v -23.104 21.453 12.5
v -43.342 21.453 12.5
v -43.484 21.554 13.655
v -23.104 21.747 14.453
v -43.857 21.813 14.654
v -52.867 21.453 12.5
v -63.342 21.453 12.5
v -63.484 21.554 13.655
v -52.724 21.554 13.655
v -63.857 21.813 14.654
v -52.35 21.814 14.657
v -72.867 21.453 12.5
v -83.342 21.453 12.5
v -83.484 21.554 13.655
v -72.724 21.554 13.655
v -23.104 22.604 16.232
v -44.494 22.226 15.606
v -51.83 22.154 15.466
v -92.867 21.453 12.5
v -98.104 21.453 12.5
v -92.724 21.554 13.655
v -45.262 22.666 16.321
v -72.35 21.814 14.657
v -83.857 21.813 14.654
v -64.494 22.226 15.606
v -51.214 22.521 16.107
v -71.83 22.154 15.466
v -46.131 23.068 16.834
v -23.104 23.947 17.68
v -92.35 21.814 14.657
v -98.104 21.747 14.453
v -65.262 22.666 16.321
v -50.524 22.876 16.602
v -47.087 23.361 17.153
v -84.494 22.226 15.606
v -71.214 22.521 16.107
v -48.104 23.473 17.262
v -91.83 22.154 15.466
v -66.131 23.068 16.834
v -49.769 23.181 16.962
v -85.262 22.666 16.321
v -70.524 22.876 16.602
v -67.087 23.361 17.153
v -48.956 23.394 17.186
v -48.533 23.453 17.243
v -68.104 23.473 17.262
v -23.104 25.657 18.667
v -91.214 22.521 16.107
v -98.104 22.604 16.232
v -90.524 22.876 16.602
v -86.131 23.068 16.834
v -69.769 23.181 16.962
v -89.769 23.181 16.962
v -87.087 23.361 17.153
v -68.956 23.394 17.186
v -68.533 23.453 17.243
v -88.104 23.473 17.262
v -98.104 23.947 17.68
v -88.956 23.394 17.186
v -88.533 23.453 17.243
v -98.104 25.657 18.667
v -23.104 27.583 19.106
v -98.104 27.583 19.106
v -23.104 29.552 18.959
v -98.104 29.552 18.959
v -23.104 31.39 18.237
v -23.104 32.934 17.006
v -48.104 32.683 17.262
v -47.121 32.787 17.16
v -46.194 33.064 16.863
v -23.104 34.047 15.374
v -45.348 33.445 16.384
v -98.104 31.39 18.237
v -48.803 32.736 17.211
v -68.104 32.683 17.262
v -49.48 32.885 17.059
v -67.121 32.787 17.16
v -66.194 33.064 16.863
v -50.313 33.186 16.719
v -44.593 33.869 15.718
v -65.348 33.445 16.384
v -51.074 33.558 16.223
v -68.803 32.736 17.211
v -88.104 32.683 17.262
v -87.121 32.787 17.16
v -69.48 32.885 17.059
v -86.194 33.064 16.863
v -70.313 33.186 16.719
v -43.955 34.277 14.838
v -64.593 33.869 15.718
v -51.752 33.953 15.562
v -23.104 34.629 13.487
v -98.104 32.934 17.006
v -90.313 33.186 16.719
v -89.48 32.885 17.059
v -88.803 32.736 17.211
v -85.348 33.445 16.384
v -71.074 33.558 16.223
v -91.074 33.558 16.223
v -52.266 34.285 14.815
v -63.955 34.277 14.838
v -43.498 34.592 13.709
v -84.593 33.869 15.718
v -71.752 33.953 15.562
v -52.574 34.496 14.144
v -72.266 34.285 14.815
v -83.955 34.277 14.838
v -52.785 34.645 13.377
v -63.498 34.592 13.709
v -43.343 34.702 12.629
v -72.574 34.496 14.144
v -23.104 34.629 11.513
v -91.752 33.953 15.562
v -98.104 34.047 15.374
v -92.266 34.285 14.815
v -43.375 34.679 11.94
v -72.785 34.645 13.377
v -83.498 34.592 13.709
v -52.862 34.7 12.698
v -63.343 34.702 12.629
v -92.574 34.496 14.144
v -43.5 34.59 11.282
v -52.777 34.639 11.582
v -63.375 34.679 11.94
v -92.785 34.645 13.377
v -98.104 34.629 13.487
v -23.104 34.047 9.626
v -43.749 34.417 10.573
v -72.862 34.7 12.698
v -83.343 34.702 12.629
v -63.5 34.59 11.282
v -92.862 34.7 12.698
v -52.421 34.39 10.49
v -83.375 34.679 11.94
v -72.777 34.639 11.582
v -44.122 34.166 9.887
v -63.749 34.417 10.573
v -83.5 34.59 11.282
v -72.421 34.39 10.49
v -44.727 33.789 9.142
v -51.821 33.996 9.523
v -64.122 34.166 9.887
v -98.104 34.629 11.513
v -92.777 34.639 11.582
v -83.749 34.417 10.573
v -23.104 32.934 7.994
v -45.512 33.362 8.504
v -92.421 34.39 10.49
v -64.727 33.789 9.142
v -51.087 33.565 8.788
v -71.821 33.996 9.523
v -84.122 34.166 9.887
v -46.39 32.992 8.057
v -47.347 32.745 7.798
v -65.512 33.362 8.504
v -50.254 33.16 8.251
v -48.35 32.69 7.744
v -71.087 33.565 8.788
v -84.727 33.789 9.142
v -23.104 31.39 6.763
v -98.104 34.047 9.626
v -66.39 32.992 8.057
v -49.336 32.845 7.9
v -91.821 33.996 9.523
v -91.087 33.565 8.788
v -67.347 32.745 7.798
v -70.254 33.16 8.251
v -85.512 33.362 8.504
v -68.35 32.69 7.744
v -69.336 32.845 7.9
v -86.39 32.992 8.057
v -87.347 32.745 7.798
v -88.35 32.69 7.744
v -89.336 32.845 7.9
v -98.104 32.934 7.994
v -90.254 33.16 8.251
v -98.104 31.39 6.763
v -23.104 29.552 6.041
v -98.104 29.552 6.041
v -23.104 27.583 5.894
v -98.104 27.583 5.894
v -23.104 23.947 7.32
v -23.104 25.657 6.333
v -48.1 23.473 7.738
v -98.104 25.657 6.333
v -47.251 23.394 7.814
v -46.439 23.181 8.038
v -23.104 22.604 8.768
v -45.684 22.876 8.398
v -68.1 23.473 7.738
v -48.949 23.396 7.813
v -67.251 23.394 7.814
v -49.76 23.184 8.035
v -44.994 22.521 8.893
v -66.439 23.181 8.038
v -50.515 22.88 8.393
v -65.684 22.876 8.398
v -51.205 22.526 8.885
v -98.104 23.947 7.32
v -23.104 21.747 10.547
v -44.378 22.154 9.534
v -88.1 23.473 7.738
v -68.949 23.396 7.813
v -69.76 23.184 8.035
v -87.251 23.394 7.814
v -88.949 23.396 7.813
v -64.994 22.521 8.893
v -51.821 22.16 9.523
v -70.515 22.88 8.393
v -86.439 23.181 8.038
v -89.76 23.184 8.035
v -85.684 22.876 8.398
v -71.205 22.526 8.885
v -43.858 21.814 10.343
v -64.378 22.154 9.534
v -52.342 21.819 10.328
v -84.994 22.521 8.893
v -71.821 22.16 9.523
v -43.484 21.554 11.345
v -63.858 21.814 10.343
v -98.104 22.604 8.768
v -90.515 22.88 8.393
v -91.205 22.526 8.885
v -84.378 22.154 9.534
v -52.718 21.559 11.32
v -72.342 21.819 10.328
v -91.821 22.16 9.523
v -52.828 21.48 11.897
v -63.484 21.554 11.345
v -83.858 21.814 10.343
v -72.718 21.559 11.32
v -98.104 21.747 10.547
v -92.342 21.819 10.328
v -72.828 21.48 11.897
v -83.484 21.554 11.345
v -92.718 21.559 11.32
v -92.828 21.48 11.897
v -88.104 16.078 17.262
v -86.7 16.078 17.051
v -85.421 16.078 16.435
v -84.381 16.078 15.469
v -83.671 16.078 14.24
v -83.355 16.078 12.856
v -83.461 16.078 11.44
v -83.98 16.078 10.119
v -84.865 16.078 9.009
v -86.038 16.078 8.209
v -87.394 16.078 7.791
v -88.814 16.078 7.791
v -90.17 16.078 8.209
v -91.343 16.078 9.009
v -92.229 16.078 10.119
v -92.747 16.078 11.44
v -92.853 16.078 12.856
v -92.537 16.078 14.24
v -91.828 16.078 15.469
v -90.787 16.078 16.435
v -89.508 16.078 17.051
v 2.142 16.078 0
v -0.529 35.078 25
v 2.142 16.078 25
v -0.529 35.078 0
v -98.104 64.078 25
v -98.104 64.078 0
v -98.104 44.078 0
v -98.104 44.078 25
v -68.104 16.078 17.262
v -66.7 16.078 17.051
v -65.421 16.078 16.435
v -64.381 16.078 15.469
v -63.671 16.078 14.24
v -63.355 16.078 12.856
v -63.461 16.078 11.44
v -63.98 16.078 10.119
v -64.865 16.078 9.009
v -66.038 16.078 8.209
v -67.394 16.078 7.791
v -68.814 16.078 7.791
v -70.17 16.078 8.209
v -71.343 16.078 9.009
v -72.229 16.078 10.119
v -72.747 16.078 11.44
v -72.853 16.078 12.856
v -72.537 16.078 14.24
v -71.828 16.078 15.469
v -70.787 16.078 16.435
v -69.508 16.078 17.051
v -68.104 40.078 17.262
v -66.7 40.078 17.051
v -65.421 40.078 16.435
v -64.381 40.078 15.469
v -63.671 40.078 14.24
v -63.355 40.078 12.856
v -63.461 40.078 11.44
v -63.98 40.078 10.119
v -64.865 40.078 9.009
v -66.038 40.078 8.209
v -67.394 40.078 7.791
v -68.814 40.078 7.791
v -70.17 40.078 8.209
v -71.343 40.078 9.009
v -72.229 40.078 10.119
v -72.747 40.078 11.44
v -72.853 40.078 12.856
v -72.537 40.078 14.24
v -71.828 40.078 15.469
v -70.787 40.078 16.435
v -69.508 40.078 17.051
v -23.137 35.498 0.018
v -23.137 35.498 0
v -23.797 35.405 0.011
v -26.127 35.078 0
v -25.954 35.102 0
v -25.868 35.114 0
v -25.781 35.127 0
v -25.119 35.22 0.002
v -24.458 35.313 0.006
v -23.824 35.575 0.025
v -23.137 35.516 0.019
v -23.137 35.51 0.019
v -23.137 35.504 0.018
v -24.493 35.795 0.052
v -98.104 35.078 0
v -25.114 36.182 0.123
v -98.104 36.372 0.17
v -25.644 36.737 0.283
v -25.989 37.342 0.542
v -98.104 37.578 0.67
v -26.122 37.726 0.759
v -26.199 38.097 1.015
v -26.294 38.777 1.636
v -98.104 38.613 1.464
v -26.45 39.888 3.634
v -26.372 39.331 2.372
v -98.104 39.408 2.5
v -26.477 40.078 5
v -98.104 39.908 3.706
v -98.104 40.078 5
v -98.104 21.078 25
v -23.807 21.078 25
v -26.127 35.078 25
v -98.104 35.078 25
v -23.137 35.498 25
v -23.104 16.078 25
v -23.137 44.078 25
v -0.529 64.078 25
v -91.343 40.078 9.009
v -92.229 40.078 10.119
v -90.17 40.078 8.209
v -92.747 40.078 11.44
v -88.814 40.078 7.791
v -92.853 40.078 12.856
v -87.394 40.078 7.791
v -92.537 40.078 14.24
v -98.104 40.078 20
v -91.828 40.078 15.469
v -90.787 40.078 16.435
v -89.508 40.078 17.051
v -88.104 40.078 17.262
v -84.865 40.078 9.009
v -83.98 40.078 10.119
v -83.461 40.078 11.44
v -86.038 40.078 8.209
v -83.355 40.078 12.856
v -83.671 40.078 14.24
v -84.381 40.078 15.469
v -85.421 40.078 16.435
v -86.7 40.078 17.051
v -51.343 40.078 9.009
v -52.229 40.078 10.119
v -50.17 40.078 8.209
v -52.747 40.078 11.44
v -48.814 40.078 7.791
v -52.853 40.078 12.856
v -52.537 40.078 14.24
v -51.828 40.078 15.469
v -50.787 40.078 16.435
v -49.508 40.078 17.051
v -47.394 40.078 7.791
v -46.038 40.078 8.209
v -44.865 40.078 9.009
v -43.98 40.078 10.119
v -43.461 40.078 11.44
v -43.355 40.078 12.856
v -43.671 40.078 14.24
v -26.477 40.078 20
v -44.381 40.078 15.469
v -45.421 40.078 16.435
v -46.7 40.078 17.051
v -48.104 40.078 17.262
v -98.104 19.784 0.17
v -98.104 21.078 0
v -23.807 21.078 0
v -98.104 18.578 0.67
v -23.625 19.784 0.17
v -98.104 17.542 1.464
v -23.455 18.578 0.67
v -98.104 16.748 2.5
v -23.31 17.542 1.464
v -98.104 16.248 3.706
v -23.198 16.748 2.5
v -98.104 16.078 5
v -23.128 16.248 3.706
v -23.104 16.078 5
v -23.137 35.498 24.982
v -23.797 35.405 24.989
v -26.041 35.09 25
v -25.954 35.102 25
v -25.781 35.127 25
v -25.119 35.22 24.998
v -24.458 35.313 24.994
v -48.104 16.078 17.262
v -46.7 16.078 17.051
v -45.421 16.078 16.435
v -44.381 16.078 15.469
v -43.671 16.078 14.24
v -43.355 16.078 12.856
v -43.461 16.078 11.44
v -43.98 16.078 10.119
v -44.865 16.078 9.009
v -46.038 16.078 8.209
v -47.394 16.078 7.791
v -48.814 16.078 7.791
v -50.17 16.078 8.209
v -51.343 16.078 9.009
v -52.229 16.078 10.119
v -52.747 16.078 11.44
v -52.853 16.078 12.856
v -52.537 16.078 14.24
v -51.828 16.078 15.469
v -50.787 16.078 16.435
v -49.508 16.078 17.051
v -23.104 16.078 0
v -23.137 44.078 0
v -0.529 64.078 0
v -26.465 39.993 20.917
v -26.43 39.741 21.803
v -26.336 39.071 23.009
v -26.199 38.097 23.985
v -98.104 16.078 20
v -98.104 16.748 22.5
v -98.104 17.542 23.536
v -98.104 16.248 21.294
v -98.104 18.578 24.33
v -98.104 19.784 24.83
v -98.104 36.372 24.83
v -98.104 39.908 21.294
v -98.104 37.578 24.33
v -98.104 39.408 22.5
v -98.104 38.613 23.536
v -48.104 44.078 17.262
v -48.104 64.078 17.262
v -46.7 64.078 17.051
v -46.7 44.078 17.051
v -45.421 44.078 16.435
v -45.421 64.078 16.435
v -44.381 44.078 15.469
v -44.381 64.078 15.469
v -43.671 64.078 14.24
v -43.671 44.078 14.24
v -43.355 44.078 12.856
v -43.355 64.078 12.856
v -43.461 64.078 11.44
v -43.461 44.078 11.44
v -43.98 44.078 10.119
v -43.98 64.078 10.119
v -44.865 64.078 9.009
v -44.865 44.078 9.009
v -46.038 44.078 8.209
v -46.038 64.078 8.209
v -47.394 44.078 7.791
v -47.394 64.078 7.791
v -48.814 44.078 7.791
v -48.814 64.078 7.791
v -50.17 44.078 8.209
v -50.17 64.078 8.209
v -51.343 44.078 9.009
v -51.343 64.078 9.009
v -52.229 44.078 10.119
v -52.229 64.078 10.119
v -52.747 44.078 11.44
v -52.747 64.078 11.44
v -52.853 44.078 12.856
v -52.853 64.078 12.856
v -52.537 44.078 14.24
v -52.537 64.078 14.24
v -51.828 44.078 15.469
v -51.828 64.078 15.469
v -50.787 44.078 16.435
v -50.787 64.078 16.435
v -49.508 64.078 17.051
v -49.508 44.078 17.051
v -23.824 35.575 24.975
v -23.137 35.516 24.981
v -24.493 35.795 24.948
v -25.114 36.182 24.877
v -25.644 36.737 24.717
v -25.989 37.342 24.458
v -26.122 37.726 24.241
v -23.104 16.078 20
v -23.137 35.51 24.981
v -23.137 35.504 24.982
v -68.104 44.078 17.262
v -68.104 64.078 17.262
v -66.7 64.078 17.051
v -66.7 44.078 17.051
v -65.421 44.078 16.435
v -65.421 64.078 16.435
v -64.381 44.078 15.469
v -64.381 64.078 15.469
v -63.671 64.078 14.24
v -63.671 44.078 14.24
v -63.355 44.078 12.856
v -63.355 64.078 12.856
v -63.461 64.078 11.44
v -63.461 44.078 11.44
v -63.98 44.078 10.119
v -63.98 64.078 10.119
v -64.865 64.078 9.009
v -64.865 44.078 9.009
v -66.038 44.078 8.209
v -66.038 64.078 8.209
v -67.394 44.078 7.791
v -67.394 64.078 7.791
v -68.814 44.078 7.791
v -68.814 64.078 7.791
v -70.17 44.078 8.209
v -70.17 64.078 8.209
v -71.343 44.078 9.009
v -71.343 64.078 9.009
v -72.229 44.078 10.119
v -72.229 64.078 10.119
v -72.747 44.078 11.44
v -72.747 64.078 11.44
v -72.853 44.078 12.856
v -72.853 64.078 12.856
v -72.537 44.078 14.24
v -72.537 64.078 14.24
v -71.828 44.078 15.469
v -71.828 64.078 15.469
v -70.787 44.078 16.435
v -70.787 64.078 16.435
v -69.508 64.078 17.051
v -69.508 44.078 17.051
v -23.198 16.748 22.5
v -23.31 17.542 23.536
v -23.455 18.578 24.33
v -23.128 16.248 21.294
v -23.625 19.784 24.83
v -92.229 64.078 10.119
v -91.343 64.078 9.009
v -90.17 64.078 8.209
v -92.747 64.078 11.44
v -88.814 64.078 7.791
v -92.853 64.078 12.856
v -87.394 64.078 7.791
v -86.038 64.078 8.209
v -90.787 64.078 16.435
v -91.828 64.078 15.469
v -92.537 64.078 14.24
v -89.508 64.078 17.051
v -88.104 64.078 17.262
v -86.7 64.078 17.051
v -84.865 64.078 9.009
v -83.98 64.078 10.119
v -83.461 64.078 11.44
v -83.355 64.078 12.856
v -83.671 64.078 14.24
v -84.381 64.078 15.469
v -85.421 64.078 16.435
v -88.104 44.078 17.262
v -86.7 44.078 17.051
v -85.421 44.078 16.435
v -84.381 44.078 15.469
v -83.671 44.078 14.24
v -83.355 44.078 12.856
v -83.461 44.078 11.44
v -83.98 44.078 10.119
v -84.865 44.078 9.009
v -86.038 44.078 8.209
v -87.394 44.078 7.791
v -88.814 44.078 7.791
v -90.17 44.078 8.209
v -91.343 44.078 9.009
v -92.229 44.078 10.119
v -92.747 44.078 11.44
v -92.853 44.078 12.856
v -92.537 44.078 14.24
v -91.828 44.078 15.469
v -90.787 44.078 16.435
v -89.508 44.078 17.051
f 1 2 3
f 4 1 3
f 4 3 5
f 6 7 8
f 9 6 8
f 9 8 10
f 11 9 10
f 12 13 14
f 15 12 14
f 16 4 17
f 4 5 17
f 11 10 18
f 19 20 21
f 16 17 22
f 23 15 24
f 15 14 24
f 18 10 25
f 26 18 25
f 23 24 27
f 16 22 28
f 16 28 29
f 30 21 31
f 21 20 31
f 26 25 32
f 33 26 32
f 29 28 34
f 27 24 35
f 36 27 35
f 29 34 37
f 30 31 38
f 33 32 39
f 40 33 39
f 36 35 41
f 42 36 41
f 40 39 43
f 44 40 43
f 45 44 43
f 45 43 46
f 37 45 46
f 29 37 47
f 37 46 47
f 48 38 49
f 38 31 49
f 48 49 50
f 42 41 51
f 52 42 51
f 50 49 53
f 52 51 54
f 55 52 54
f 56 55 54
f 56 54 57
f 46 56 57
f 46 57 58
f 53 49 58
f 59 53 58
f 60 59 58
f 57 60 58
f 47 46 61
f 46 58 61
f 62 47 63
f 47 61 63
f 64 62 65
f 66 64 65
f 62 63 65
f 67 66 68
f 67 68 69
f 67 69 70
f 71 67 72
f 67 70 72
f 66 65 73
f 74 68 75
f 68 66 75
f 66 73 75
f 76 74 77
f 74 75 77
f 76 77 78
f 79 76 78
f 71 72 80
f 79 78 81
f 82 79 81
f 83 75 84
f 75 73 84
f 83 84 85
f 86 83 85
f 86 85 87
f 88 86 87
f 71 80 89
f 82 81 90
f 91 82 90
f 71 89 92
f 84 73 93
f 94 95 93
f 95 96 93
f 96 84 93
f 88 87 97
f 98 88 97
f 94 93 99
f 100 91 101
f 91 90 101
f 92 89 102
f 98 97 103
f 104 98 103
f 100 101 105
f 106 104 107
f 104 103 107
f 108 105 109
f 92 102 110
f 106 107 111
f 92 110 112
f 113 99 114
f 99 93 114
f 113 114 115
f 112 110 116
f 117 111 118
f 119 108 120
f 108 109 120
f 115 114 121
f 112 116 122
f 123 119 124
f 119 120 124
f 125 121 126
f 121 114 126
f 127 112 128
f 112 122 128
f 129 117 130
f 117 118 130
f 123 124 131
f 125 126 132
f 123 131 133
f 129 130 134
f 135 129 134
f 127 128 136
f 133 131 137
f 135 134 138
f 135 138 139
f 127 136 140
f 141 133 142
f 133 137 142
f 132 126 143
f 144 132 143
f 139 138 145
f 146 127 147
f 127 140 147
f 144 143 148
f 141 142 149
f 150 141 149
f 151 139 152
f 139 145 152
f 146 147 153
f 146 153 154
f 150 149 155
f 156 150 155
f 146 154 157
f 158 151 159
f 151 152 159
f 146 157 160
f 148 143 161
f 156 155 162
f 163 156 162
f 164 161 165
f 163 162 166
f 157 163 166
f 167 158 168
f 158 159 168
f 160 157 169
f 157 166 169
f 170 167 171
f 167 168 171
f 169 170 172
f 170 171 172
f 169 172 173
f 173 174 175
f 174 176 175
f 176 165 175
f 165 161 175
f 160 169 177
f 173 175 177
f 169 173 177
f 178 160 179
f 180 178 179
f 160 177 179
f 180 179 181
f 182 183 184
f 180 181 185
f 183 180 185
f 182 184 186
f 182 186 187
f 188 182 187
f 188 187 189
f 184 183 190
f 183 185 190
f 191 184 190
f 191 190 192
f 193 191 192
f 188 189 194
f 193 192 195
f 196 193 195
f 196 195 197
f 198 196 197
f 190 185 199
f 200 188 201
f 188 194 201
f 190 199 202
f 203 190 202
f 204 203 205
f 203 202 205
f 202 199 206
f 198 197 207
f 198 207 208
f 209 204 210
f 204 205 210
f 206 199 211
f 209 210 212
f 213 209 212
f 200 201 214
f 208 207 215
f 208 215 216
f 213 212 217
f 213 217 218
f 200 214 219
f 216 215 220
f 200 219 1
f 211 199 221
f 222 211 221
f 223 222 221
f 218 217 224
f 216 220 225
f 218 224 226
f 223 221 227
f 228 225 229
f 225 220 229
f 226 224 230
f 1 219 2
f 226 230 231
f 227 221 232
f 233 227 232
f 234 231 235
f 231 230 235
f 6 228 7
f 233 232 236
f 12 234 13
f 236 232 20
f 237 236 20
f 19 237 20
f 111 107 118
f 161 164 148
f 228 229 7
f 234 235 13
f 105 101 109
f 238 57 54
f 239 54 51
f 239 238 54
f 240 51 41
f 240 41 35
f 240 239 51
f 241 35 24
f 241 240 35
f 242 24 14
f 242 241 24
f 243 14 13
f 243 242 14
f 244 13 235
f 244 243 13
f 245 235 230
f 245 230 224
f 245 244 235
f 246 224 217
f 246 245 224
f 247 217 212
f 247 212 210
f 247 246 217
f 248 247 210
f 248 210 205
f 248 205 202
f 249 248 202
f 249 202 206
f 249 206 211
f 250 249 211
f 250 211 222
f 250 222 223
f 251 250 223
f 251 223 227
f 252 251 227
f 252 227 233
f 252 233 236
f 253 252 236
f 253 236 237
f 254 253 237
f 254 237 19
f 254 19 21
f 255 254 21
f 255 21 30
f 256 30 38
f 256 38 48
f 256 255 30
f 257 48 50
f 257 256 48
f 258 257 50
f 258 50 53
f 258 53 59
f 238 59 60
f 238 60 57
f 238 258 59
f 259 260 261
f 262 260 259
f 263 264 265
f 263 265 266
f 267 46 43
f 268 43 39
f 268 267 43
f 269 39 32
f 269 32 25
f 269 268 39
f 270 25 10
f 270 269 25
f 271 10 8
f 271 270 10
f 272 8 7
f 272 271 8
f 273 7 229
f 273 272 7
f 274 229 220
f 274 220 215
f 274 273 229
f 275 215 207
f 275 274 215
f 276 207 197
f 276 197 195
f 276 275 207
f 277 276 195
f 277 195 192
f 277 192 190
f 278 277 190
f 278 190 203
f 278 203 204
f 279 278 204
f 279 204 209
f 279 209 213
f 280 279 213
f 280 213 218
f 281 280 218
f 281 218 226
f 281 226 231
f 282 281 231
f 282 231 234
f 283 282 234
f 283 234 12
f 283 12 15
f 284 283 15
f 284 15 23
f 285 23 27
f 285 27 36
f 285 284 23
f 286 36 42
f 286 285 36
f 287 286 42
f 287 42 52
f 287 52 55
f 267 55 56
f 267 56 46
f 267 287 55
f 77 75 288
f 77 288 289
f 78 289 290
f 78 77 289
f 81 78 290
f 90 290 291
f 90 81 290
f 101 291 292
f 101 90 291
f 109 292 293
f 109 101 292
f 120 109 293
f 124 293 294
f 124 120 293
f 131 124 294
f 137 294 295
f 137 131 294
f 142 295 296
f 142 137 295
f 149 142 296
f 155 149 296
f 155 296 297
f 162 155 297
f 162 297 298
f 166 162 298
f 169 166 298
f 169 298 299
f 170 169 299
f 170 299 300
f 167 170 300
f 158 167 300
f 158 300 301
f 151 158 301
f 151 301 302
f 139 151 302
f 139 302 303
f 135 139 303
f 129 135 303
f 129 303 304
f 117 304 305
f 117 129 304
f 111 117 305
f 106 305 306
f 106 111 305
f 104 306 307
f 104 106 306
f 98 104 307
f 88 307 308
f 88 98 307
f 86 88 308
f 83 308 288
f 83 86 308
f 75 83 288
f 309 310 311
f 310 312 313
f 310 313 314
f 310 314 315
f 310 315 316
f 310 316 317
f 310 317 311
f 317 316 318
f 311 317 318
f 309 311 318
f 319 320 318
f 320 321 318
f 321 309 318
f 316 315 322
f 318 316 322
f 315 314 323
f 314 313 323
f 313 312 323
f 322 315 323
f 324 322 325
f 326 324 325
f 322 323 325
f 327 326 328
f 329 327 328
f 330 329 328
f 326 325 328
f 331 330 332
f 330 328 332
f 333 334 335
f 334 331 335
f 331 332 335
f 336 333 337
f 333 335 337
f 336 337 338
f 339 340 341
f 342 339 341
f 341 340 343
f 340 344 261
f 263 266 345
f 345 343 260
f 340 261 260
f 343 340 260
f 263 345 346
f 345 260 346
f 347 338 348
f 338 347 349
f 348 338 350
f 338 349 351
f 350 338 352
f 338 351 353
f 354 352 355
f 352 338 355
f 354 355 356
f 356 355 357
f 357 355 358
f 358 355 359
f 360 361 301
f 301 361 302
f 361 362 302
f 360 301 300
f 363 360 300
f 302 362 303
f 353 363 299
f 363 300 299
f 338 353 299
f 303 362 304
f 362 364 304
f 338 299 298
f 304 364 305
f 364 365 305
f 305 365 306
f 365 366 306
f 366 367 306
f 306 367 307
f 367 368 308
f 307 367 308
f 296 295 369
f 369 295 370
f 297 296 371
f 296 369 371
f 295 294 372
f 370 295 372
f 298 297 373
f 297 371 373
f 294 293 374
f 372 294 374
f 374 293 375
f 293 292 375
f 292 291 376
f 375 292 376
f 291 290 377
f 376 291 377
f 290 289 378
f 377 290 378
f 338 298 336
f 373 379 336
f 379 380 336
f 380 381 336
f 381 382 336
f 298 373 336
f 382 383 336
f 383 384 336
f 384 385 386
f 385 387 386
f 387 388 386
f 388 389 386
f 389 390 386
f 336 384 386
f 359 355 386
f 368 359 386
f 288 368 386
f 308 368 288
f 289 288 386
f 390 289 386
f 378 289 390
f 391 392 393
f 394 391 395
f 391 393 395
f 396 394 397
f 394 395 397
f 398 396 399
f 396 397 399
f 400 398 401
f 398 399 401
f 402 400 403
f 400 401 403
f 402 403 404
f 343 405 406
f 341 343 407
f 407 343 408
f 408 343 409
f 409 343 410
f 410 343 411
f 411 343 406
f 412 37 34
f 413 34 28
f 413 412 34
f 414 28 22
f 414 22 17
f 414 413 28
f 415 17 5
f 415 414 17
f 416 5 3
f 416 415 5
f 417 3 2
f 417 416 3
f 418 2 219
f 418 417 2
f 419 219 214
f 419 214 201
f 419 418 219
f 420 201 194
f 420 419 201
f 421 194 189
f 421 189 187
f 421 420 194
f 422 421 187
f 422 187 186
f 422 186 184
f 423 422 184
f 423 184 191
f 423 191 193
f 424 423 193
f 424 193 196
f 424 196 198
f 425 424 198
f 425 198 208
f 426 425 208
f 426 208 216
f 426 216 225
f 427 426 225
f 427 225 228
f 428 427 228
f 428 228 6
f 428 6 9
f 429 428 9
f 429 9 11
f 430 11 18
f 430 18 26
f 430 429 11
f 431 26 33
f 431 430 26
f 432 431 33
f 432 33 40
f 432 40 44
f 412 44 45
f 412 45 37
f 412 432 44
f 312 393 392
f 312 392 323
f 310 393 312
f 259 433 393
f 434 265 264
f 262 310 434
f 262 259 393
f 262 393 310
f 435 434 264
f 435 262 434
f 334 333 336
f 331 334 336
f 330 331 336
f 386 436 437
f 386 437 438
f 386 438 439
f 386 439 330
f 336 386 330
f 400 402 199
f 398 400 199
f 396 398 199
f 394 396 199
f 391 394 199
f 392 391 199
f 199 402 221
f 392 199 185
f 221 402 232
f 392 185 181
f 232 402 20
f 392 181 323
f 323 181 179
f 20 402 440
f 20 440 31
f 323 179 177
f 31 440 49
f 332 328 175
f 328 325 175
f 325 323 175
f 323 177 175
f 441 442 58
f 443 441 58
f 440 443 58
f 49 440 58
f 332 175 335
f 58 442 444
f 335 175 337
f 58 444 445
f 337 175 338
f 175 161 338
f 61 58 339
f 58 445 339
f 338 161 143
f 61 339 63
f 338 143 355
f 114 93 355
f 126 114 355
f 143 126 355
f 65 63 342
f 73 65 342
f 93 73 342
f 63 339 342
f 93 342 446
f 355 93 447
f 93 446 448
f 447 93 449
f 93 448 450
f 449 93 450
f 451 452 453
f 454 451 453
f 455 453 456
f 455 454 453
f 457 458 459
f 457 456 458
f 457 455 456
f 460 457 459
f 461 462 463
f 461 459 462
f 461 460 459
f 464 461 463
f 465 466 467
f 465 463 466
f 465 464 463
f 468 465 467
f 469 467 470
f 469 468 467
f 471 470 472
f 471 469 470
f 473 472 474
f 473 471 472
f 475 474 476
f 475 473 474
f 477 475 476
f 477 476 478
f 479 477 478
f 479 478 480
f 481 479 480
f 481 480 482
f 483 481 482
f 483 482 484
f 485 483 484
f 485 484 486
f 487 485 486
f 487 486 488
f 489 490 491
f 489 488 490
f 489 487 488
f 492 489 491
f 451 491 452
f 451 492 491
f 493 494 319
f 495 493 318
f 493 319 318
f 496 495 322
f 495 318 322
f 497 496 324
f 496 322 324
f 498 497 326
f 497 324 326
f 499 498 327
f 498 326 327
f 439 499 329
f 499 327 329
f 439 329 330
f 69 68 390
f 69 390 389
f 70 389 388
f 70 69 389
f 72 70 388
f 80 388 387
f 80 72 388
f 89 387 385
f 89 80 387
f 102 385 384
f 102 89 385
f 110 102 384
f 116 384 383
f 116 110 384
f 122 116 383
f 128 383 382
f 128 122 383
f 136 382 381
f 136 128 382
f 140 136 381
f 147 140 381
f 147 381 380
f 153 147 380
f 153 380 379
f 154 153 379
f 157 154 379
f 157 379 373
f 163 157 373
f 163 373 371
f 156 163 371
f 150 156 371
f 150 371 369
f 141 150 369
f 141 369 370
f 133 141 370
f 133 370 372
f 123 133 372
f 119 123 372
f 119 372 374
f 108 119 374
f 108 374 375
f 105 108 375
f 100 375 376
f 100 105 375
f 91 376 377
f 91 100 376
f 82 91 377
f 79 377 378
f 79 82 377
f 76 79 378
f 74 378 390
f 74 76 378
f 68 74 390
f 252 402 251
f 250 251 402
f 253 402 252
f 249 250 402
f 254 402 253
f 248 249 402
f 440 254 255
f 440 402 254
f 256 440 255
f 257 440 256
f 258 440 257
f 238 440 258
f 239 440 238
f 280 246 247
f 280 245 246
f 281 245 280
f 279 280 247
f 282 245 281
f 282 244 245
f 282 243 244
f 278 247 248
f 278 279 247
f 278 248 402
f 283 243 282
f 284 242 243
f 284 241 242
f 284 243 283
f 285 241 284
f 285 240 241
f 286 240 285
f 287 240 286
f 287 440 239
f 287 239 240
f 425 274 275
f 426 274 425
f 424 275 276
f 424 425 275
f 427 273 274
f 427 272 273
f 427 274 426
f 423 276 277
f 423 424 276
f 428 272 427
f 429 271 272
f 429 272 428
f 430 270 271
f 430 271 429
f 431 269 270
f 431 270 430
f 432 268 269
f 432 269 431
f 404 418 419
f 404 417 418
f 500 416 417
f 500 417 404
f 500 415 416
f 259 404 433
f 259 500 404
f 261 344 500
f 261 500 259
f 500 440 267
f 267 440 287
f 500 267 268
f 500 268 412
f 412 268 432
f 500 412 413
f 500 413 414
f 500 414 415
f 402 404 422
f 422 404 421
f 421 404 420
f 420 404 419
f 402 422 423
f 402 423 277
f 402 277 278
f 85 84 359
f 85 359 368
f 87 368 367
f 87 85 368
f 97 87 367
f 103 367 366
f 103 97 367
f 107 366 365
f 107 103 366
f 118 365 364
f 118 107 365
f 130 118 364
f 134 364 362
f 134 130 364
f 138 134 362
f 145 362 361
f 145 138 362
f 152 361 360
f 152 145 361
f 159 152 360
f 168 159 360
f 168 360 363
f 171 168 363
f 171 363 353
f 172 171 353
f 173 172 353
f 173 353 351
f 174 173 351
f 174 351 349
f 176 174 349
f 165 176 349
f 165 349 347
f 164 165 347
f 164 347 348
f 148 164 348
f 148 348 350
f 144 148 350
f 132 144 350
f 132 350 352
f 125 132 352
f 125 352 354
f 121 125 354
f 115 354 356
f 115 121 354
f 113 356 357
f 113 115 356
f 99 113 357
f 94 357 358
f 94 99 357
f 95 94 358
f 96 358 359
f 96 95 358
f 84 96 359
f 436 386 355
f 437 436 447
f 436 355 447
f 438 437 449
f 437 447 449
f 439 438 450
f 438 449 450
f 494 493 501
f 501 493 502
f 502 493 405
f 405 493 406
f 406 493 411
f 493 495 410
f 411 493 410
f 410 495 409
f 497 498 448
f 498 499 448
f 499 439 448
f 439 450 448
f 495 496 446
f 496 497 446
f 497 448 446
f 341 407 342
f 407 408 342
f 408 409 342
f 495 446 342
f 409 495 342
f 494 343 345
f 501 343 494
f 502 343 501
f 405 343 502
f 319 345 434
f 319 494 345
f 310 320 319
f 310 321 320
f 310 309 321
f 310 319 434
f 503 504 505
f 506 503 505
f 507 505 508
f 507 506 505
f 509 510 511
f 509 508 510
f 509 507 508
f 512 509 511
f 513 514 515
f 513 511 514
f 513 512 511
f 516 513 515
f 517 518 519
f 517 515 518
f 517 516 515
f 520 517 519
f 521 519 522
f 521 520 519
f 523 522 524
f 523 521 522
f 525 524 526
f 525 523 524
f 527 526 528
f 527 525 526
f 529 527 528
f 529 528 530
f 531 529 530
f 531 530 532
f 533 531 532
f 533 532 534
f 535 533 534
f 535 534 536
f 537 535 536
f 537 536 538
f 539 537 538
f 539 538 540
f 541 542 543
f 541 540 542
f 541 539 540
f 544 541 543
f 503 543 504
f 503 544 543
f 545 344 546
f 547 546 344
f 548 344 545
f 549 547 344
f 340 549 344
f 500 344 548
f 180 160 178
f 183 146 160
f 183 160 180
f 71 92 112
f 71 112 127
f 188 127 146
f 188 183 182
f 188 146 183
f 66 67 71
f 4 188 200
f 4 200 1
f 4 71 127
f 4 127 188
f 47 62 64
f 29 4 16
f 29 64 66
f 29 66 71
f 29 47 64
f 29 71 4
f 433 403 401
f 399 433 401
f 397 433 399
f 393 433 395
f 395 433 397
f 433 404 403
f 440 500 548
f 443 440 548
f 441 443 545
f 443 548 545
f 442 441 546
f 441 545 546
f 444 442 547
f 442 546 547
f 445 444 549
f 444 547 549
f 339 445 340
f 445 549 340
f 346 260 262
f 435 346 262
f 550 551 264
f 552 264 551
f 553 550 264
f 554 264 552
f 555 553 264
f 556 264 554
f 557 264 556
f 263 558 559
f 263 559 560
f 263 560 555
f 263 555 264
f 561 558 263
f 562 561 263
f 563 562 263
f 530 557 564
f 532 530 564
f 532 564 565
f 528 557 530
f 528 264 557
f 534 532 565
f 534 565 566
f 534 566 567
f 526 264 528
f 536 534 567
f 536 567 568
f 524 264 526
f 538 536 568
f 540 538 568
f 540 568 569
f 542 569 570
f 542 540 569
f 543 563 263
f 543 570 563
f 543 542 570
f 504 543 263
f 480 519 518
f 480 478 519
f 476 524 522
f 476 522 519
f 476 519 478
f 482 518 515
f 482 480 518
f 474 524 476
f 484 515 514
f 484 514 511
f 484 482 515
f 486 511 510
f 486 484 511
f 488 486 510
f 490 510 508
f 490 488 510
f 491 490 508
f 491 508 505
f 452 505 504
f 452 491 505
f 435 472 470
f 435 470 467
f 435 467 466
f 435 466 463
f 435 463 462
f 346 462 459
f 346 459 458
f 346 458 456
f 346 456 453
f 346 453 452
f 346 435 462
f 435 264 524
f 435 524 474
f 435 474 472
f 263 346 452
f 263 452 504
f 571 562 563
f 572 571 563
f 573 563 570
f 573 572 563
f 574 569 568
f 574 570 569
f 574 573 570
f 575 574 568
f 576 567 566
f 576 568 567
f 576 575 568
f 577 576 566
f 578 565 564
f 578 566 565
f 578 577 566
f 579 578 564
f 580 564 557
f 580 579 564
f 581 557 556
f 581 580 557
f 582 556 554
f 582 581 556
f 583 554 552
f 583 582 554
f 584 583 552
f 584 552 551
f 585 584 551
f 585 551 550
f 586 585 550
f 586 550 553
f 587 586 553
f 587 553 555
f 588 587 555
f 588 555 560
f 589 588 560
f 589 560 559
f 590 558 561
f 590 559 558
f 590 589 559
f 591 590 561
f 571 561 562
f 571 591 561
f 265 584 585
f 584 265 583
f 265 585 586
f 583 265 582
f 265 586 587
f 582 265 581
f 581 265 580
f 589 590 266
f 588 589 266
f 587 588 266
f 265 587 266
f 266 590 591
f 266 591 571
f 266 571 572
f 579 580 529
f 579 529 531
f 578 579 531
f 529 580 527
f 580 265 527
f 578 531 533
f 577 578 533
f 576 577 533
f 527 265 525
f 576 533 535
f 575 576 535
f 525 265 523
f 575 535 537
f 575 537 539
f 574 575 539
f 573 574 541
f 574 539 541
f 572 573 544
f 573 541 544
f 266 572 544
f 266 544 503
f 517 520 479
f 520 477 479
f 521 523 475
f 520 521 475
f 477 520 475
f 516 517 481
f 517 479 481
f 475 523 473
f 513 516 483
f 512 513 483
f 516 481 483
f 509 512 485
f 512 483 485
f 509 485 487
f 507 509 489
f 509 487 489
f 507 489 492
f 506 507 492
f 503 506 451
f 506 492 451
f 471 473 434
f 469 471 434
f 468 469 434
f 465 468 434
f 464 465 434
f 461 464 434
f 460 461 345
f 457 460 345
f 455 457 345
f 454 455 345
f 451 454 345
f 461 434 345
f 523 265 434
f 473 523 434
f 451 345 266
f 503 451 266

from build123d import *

# Parameters (mm, degrees)
SKETCH1_W                = 50
SKETCH1_H                = 25
BOSS_EXTRUDE1_DEPTH      = 25
BOSS_EXTRUDE2_DEPTH      = 25
SKETCH4_R                = 6.625
CUT_EXTRUDE1_DEPTH       = 75
SKETCH9_R                = 3.1
CUT_EXTRUDE6_DEPTH       = 116.938210964
FILLET3_R                = 5
FILLET5_R                = 3
SKETCH10_W               = 47.732743957
SKETCH10_H               = 107.667843513
CUT_EXTRUDE7_DEPTH       = 100
SKETCH11_W               = 28.236029243
SKETCH11_H               = 25
CUT_EXTRUDE8_DEPTH       = 111.285013225
SKETCH12_W               = 27.477268163
SKETCH12_H               = 27.699456316
CUT_EXTRUDE9_DEPTH       = 5
BODY_MOVE_COPY1_ANGLE    = 8
SKETCH13_W               = 22.608001889
SKETCH13_H               = 25
BOSS_EXTRUDE3_DEPTH      = 29
SKETCH14_W               = 25
SKETCH14_H               = 20
BOSS_EXTRUDE4_DEPTH      = 74.967411564
CUT_EXTRUDE10_DEPTH      = 113.041997451
CUT_EXTRUDE10_DEPTH_BACK = 113.041997451
SKETCH15_R               = 4.7625
SKETCH15_R_2             = 3.1


with BuildPart() as part:
    # Sketch1 → Boss-Extrude1 (new body)
    with BuildSketch(Plane.XY):
        Rectangle(SKETCH1_W, SKETCH1_H)
    extrude(amount=BOSS_EXTRUDE1_DEPTH)

    # Sketch3 → Boss-Extrude2 (add)
    with BuildSketch(Plane.XY.offset(25)):
        Polygon((-25, 12.5), (-99.270105156, 22.937982572), (-95.929950733, 46.704416222), (-25, 36.73586174), (-25, 31.73586174), (25, 31.73586174), (25, 36.73586174), (95.929950733, 46.704416222), (99.270105156, 22.937982572), (25, 12.5), align=None)
    extrude(amount=-BOSS_EXTRUDE2_DEPTH)

    # Sketch4 → Cut-Extrude1 (cut)
    with BuildSketch(Plane(origin=(-100.508609829, 14.12556392, 0), x_dir=(0, 0, 1), z_dir=(-0.9902680687415705, 0.13917310096006502, 0))):
        with Locations(Location((12.5, 20.899023335, 0), (0, 0, 270))):
            Circle(SKETCH4_R)
    cut_extrude1 = extrude(amount=-CUT_EXTRUDE1_DEPTH, mode=Mode.SUBTRACT)

    # Mirror1: Cut-Extrude1 across plane
    add(cut_extrude1.mirror(Plane(origin=(0, 0, 0), x_dir=(0, 0, 1), z_dir=(1, 0, 0))), mode=Mode.SUBTRACT)

    # Sketch9 → Cut-Extrude6 (cut, through all)
    with BuildSketch(Plane(origin=(4.578659096, 32.578852302, 0), x_dir=(0.9902680687415703, -0.1391731009600656, 0), z_dir=(0.1391731009600656, 0.9902680687415703, 0))):
        with Locations(Location((-91.496365481, -12.5, 0), (0, 0, 180))):
            Circle(SKETCH9_R)
        with Locations(Location((-71.496365481, -12.5, 0), (0, 0, 180))):
            Circle(SKETCH9_R)
        with Locations(Location((-51.496365481, -12.5, 0), (0, 0, 180))):
            Circle(SKETCH9_R)
    extrude(amount=-CUT_EXTRUDE6_DEPTH, mode=Mode.SUBTRACT)

    # Fillet3
    # the kernel refuses this fillet: 5 mm, written as the material it takes off along each edge
    with BuildSketch(Plane(origin=(111.648456015, 24.677646334, 25), x_dir=(-0.13917310096006577, 0.9902680687415704, 0), z_dir=(-0.9902680687415703, -0.13917310096006574, 0))) as fillet3_piece_1_section:
        with BuildLine():
            CenterArc((FILLET3_R, FILLET3_R), FILLET3_R, 180, 90)
            Line((0, FILLET3_R), (0, 0))
            Line((0, 0), (FILLET3_R, 0))
        make_face()
    fillet3_piece_1 = extrude(amount=100, mode=Mode.PRIVATE)
    fillet3_piece_1 = split(fillet3_piece_1, bisect_by=Plane(origin=(25, 18.834233779, 23.882189323), z_dir=(1, 0, 0)), keep=Keep.TOP, mode=Mode.PRIVATE)
    add(fillet3_piece_1, mode=Mode.SUBTRACT)
    with BuildSketch(Plane(origin=(12.621649141, 34.996197978, 25), x_dir=(0.13917310096006597, -0.9902680687415704, 0), z_dir=(0.9902680687415703, 0.13917310096006597, 0))) as fillet3_piece_2_section:
        with BuildLine():
            CenterArc((FILLET3_R, FILLET3_R), FILLET3_R, 180, 90)
            Line((0, FILLET3_R), (0, 0))
            Line((0, 0), (FILLET3_R, 0))
        make_face()
    fillet3_piece_2 = extrude(amount=96.627019967, mode=Mode.PRIVATE)
    fillet3_piece_2 = split(fillet3_piece_2, bisect_by=Plane(origin=(60.542812169, 31.73586174, 23.884172665), z_dir=(0, 1, 0)), keep=Keep.TOP, mode=Mode.PRIVATE)
    add(fillet3_piece_2, mode=Mode.SUBTRACT)
    with BuildSketch(Plane(origin=(-108.308301592, 48.444079984, 25), x_dir=(-0.13917310096006566, -0.9902680687415704, 0), z_dir=(0.9902680687415704, -0.13917310096006566, 0))) as fillet3_piece_3_section:
        with BuildLine():
            CenterArc((FILLET3_R, FILLET3_R), FILLET3_R, 180, 90)
            Line((0, FILLET3_R), (0, 0))
            Line((0, 0), (FILLET3_R, 0))
        make_face()
    fillet3_piece_3 = extrude(amount=96.627019967, mode=Mode.PRIVATE)
    fillet3_piece_3 = split(fillet3_piece_3, bisect_by=Plane(origin=(-60.542812169, 31.73586174, 23.884172665), z_dir=(0, 1, 0)), keep=Keep.TOP, mode=Mode.PRIVATE)
    add(fillet3_piece_3, mode=Mode.SUBTRACT)
    with BuildSketch(Plane(origin=(-12.621649141, 10.760336238, 25), x_dir=(0.13917310096006563, 0.9902680687415704, 0), z_dir=(-0.9902680687415703, 0.13917310096006563, 0))) as fillet3_piece_4_section:
        with BuildLine():
            CenterArc((FILLET3_R, FILLET3_R), FILLET3_R, 180, 90)
            Line((0, FILLET3_R), (0, 0))
            Line((0, 0), (FILLET3_R, 0))
        make_face()
    fillet3_piece_4 = extrude(amount=100, mode=Mode.PRIVATE)
    fillet3_piece_4 = split(fillet3_piece_4, bisect_by=Plane(origin=(-25, 18.834233779, 23.882189323), z_dir=(-1, 0, 0)), keep=Keep.TOP, mode=Mode.PRIVATE)
    add(fillet3_piece_4, mode=Mode.SUBTRACT)
    with BuildSketch(Plane(origin=(111.648456015, 24.677646334, 0), x_dir=(-0.13917310096006577, 0.9902680687415704, 0), z_dir=(-0.9902680687415703, -0.13917310096006574, 0))) as fillet3_piece_5_section:
        with BuildLine():
            CenterArc((FILLET3_R, -FILLET3_R), FILLET3_R, 90, 90)
            Line((0, -FILLET3_R), (0, 0))
            Line((0, 0), (FILLET3_R, 0))
        make_face()
    fillet3_piece_5 = extrude(amount=100, mode=Mode.PRIVATE)
    fillet3_piece_5 = split(fillet3_piece_5, bisect_by=Plane(origin=(25, 18.834233779, 1.117810677), z_dir=(1, 0, 0)), keep=Keep.TOP, mode=Mode.PRIVATE)
    add(fillet3_piece_5, mode=Mode.SUBTRACT)
    with BuildSketch(Plane(origin=(12.621649141, 34.996197978, 0), x_dir=(0.13917310096006597, -0.9902680687415704, 0), z_dir=(0.9902680687415703, 0.13917310096006597, 0))) as fillet3_piece_6_section:
        with BuildLine():
            CenterArc((FILLET3_R, -FILLET3_R), FILLET3_R, 90, 90)
            Line((0, -FILLET3_R), (0, 0))
            Line((0, 0), (FILLET3_R, 0))
        make_face()
    fillet3_piece_6 = extrude(amount=96.627019967, mode=Mode.PRIVATE)
    fillet3_piece_6 = split(fillet3_piece_6, bisect_by=Plane(origin=(60.542812169, 31.73586174, 1.115827335), z_dir=(0, 1, 0)), keep=Keep.TOP, mode=Mode.PRIVATE)
    add(fillet3_piece_6, mode=Mode.SUBTRACT)
    with BuildSketch(Plane(origin=(-108.308301592, 48.444079984, 0), x_dir=(-0.13917310096006566, -0.9902680687415704, 0), z_dir=(0.9902680687415704, -0.13917310096006566, 0))) as fillet3_piece_7_section:
        with BuildLine():
            CenterArc((FILLET3_R, -FILLET3_R), FILLET3_R, 90, 90)
            Line((0, -FILLET3_R), (0, 0))
            Line((0, 0), (FILLET3_R, 0))
        make_face()
    fillet3_piece_7 = extrude(amount=96.627019967, mode=Mode.PRIVATE)
    fillet3_piece_7 = split(fillet3_piece_7, bisect_by=Plane(origin=(-60.542812169, 31.73586174, 1.115827335), z_dir=(0, 1, 0)), keep=Keep.TOP, mode=Mode.PRIVATE)
    add(fillet3_piece_7, mode=Mode.SUBTRACT)
    with BuildSketch(Plane(origin=(-12.621649141, 10.760336238, 0), x_dir=(0.13917310096006563, 0.9902680687415704, 0), z_dir=(-0.9902680687415703, 0.13917310096006563, 0))) as fillet3_piece_8_section:
        with BuildLine():
            CenterArc((FILLET3_R, -FILLET3_R), FILLET3_R, 90, 90)
            Line((0, -FILLET3_R), (0, 0))
            Line((0, 0), (FILLET3_R, 0))
        make_face()
    fillet3_piece_8 = extrude(amount=100, mode=Mode.PRIVATE)
    fillet3_piece_8 = split(fillet3_piece_8, bisect_by=Plane(origin=(-25, 18.834233779, 1.117810677), z_dir=(-1, 0, 0)), keep=Keep.TOP, mode=Mode.PRIVATE)
    add(fillet3_piece_8, mode=Mode.SUBTRACT)

    # Fillet5
    fillet5_edges = [part.edges().sort_by_distance(p)[0] for p in [
        (25, 31.73586174, 12.5),
        (-25, 31.73586174, 12.5),
    ]]
    fillet(fillet5_edges, radius=FILLET5_R)

    # Sketch10 → Cut-Extrude7 (cut)
    with BuildSketch(Plane(origin=(0, 0, 0), x_dir=(0, 0, -1), z_dir=(1, 0, 0))):
        with Locations((-11.782214376, 4.002620484)):
            Rectangle(SKETCH10_W, SKETCH10_H)
    extrude(amount=CUT_EXTRUDE7_DEPTH, mode=Mode.SUBTRACT)

    # Sketch11 → Cut-Extrude8 (cut, through all)
    with BuildSketch(Plane(origin=(1.238504673, 8.812418652, 0), x_dir=(0.9902680687415703, -0.13917310096006563, 0), z_dir=(-0.13917310096006563, -0.9902680687415703, 0))):
        with Locations((-12.37835086, 12.5)):
            Rectangle(SKETCH11_W, SKETCH11_H)
    extrude(amount=CUT_EXTRUDE8_DEPTH, mode=Mode.SUBTRACT)

    # Sketch12 → Cut-Extrude9 (cut)
    with BuildSketch(Plane(origin=(4.578659096, 32.578852302, 0), x_dir=(0.9902680687415703, -0.1391731009600656, 0), z_dir=(0.1391731009600656, 0.9902680687415703, 0))):
        with Locations((-12.790319835, -12.604422979)):
            Rectangle(SKETCH12_W, SKETCH12_H)
    extrude(amount=-CUT_EXTRUDE9_DEPTH, mode=Mode.SUBTRACT)


with BuildPart() as part_1:
    # Body-Move/Copy1: moved
    add(part.part.rotate(Axis((-49.635052578, 27.845447677, 0), (0, 0, 1)), BODY_MOVE_COPY1_ANGLE))

    # Sketch13 → Boss-Extrude3 (add)
    with BuildSketch(Plane(origin=(0, 35.077877501, 0), x_dir=(1, 0, 0), z_dir=(0, 1, 0))):
        with Locations((-11.832660591, -12.5)):
            Rectangle(SKETCH13_W, SKETCH13_H)
    extrude(amount=BOSS_EXTRUDE3_DEPTH)

    # Sketch14 → Boss-Extrude4 (add)
    with BuildSketch(Plane.ZY.offset(23.136661535)):
        with Locations((12.5, 54.077877501)):
            Rectangle(SKETCH14_W, SKETCH14_H)
    extrude(amount=BOSS_EXTRUDE4_DEPTH)

    # Sketch15 → Cut-Extrude10 (cut, two sides: drawn at the far end of the back side and taken through both)
    # profile 1 of 6: a face of its own
    with BuildSketch(Plane(origin=(0, 64.077877501, 0), x_dir=(1, 0, 0), z_dir=(0, 1, 0)).offset(-CUT_EXTRUDE10_DEPTH_BACK)):
        with Locations(Location((-88.104073099, -12.5, 0), (0, 0, 270))):
            Circle(SKETCH15_R)
        with Locations((-88.104073099, -12.5)):
            Circle(SKETCH15_R_2, mode=Mode.SUBTRACT)
    # profile 2 of 6: a face of its own
    with BuildSketch(Plane(origin=(0, 64.077877501, 0), x_dir=(1, 0, 0), z_dir=(0, 1, 0)).offset(-CUT_EXTRUDE10_DEPTH_BACK)):
        with Locations((-88.104073099, -12.5)):
            Circle(SKETCH15_R_2)
    # profile 3 of 6: a face of its own
    with BuildSketch(Plane(origin=(0, 64.077877501, 0), x_dir=(1, 0, 0), z_dir=(0, 1, 0)).offset(-CUT_EXTRUDE10_DEPTH_BACK)):
        with Locations(Location((-68.104073099, -12.5, 0), (0, 0, 270))):
            Circle(SKETCH15_R)
        with Locations((-68.104073099, -12.5)):
            Circle(SKETCH15_R_2, mode=Mode.SUBTRACT)
    # profile 4 of 6: a face of its own
    with BuildSketch(Plane(origin=(0, 64.077877501, 0), x_dir=(1, 0, 0), z_dir=(0, 1, 0)).offset(-CUT_EXTRUDE10_DEPTH_BACK)):
        with Locations((-68.104073099, -12.5)):
            Circle(SKETCH15_R_2)
    # profile 5 of 6: a face of its own
    with BuildSketch(Plane(origin=(0, 64.077877501, 0), x_dir=(1, 0, 0), z_dir=(0, 1, 0)).offset(-CUT_EXTRUDE10_DEPTH_BACK)):
        with Locations(Location((-48.104073099, -12.5, 0), (0, 0, 270))):
            Circle(SKETCH15_R)
        with Locations((-48.104073099, -12.5)):
            Circle(SKETCH15_R_2, mode=Mode.SUBTRACT)
    # profile 6 of 6: a face of its own
    with BuildSketch(Plane(origin=(0, 64.077877501, 0), x_dir=(1, 0, 0), z_dir=(0, 1, 0)).offset(-CUT_EXTRUDE10_DEPTH_BACK)):
        with Locations((-48.104073099, -12.5)):
            Circle(SKETCH15_R_2)
    extrude(amount=CUT_EXTRUDE10_DEPTH + CUT_EXTRUDE10_DEPTH_BACK, mode=Mode.SUBTRACT)


solid = part_1.part
